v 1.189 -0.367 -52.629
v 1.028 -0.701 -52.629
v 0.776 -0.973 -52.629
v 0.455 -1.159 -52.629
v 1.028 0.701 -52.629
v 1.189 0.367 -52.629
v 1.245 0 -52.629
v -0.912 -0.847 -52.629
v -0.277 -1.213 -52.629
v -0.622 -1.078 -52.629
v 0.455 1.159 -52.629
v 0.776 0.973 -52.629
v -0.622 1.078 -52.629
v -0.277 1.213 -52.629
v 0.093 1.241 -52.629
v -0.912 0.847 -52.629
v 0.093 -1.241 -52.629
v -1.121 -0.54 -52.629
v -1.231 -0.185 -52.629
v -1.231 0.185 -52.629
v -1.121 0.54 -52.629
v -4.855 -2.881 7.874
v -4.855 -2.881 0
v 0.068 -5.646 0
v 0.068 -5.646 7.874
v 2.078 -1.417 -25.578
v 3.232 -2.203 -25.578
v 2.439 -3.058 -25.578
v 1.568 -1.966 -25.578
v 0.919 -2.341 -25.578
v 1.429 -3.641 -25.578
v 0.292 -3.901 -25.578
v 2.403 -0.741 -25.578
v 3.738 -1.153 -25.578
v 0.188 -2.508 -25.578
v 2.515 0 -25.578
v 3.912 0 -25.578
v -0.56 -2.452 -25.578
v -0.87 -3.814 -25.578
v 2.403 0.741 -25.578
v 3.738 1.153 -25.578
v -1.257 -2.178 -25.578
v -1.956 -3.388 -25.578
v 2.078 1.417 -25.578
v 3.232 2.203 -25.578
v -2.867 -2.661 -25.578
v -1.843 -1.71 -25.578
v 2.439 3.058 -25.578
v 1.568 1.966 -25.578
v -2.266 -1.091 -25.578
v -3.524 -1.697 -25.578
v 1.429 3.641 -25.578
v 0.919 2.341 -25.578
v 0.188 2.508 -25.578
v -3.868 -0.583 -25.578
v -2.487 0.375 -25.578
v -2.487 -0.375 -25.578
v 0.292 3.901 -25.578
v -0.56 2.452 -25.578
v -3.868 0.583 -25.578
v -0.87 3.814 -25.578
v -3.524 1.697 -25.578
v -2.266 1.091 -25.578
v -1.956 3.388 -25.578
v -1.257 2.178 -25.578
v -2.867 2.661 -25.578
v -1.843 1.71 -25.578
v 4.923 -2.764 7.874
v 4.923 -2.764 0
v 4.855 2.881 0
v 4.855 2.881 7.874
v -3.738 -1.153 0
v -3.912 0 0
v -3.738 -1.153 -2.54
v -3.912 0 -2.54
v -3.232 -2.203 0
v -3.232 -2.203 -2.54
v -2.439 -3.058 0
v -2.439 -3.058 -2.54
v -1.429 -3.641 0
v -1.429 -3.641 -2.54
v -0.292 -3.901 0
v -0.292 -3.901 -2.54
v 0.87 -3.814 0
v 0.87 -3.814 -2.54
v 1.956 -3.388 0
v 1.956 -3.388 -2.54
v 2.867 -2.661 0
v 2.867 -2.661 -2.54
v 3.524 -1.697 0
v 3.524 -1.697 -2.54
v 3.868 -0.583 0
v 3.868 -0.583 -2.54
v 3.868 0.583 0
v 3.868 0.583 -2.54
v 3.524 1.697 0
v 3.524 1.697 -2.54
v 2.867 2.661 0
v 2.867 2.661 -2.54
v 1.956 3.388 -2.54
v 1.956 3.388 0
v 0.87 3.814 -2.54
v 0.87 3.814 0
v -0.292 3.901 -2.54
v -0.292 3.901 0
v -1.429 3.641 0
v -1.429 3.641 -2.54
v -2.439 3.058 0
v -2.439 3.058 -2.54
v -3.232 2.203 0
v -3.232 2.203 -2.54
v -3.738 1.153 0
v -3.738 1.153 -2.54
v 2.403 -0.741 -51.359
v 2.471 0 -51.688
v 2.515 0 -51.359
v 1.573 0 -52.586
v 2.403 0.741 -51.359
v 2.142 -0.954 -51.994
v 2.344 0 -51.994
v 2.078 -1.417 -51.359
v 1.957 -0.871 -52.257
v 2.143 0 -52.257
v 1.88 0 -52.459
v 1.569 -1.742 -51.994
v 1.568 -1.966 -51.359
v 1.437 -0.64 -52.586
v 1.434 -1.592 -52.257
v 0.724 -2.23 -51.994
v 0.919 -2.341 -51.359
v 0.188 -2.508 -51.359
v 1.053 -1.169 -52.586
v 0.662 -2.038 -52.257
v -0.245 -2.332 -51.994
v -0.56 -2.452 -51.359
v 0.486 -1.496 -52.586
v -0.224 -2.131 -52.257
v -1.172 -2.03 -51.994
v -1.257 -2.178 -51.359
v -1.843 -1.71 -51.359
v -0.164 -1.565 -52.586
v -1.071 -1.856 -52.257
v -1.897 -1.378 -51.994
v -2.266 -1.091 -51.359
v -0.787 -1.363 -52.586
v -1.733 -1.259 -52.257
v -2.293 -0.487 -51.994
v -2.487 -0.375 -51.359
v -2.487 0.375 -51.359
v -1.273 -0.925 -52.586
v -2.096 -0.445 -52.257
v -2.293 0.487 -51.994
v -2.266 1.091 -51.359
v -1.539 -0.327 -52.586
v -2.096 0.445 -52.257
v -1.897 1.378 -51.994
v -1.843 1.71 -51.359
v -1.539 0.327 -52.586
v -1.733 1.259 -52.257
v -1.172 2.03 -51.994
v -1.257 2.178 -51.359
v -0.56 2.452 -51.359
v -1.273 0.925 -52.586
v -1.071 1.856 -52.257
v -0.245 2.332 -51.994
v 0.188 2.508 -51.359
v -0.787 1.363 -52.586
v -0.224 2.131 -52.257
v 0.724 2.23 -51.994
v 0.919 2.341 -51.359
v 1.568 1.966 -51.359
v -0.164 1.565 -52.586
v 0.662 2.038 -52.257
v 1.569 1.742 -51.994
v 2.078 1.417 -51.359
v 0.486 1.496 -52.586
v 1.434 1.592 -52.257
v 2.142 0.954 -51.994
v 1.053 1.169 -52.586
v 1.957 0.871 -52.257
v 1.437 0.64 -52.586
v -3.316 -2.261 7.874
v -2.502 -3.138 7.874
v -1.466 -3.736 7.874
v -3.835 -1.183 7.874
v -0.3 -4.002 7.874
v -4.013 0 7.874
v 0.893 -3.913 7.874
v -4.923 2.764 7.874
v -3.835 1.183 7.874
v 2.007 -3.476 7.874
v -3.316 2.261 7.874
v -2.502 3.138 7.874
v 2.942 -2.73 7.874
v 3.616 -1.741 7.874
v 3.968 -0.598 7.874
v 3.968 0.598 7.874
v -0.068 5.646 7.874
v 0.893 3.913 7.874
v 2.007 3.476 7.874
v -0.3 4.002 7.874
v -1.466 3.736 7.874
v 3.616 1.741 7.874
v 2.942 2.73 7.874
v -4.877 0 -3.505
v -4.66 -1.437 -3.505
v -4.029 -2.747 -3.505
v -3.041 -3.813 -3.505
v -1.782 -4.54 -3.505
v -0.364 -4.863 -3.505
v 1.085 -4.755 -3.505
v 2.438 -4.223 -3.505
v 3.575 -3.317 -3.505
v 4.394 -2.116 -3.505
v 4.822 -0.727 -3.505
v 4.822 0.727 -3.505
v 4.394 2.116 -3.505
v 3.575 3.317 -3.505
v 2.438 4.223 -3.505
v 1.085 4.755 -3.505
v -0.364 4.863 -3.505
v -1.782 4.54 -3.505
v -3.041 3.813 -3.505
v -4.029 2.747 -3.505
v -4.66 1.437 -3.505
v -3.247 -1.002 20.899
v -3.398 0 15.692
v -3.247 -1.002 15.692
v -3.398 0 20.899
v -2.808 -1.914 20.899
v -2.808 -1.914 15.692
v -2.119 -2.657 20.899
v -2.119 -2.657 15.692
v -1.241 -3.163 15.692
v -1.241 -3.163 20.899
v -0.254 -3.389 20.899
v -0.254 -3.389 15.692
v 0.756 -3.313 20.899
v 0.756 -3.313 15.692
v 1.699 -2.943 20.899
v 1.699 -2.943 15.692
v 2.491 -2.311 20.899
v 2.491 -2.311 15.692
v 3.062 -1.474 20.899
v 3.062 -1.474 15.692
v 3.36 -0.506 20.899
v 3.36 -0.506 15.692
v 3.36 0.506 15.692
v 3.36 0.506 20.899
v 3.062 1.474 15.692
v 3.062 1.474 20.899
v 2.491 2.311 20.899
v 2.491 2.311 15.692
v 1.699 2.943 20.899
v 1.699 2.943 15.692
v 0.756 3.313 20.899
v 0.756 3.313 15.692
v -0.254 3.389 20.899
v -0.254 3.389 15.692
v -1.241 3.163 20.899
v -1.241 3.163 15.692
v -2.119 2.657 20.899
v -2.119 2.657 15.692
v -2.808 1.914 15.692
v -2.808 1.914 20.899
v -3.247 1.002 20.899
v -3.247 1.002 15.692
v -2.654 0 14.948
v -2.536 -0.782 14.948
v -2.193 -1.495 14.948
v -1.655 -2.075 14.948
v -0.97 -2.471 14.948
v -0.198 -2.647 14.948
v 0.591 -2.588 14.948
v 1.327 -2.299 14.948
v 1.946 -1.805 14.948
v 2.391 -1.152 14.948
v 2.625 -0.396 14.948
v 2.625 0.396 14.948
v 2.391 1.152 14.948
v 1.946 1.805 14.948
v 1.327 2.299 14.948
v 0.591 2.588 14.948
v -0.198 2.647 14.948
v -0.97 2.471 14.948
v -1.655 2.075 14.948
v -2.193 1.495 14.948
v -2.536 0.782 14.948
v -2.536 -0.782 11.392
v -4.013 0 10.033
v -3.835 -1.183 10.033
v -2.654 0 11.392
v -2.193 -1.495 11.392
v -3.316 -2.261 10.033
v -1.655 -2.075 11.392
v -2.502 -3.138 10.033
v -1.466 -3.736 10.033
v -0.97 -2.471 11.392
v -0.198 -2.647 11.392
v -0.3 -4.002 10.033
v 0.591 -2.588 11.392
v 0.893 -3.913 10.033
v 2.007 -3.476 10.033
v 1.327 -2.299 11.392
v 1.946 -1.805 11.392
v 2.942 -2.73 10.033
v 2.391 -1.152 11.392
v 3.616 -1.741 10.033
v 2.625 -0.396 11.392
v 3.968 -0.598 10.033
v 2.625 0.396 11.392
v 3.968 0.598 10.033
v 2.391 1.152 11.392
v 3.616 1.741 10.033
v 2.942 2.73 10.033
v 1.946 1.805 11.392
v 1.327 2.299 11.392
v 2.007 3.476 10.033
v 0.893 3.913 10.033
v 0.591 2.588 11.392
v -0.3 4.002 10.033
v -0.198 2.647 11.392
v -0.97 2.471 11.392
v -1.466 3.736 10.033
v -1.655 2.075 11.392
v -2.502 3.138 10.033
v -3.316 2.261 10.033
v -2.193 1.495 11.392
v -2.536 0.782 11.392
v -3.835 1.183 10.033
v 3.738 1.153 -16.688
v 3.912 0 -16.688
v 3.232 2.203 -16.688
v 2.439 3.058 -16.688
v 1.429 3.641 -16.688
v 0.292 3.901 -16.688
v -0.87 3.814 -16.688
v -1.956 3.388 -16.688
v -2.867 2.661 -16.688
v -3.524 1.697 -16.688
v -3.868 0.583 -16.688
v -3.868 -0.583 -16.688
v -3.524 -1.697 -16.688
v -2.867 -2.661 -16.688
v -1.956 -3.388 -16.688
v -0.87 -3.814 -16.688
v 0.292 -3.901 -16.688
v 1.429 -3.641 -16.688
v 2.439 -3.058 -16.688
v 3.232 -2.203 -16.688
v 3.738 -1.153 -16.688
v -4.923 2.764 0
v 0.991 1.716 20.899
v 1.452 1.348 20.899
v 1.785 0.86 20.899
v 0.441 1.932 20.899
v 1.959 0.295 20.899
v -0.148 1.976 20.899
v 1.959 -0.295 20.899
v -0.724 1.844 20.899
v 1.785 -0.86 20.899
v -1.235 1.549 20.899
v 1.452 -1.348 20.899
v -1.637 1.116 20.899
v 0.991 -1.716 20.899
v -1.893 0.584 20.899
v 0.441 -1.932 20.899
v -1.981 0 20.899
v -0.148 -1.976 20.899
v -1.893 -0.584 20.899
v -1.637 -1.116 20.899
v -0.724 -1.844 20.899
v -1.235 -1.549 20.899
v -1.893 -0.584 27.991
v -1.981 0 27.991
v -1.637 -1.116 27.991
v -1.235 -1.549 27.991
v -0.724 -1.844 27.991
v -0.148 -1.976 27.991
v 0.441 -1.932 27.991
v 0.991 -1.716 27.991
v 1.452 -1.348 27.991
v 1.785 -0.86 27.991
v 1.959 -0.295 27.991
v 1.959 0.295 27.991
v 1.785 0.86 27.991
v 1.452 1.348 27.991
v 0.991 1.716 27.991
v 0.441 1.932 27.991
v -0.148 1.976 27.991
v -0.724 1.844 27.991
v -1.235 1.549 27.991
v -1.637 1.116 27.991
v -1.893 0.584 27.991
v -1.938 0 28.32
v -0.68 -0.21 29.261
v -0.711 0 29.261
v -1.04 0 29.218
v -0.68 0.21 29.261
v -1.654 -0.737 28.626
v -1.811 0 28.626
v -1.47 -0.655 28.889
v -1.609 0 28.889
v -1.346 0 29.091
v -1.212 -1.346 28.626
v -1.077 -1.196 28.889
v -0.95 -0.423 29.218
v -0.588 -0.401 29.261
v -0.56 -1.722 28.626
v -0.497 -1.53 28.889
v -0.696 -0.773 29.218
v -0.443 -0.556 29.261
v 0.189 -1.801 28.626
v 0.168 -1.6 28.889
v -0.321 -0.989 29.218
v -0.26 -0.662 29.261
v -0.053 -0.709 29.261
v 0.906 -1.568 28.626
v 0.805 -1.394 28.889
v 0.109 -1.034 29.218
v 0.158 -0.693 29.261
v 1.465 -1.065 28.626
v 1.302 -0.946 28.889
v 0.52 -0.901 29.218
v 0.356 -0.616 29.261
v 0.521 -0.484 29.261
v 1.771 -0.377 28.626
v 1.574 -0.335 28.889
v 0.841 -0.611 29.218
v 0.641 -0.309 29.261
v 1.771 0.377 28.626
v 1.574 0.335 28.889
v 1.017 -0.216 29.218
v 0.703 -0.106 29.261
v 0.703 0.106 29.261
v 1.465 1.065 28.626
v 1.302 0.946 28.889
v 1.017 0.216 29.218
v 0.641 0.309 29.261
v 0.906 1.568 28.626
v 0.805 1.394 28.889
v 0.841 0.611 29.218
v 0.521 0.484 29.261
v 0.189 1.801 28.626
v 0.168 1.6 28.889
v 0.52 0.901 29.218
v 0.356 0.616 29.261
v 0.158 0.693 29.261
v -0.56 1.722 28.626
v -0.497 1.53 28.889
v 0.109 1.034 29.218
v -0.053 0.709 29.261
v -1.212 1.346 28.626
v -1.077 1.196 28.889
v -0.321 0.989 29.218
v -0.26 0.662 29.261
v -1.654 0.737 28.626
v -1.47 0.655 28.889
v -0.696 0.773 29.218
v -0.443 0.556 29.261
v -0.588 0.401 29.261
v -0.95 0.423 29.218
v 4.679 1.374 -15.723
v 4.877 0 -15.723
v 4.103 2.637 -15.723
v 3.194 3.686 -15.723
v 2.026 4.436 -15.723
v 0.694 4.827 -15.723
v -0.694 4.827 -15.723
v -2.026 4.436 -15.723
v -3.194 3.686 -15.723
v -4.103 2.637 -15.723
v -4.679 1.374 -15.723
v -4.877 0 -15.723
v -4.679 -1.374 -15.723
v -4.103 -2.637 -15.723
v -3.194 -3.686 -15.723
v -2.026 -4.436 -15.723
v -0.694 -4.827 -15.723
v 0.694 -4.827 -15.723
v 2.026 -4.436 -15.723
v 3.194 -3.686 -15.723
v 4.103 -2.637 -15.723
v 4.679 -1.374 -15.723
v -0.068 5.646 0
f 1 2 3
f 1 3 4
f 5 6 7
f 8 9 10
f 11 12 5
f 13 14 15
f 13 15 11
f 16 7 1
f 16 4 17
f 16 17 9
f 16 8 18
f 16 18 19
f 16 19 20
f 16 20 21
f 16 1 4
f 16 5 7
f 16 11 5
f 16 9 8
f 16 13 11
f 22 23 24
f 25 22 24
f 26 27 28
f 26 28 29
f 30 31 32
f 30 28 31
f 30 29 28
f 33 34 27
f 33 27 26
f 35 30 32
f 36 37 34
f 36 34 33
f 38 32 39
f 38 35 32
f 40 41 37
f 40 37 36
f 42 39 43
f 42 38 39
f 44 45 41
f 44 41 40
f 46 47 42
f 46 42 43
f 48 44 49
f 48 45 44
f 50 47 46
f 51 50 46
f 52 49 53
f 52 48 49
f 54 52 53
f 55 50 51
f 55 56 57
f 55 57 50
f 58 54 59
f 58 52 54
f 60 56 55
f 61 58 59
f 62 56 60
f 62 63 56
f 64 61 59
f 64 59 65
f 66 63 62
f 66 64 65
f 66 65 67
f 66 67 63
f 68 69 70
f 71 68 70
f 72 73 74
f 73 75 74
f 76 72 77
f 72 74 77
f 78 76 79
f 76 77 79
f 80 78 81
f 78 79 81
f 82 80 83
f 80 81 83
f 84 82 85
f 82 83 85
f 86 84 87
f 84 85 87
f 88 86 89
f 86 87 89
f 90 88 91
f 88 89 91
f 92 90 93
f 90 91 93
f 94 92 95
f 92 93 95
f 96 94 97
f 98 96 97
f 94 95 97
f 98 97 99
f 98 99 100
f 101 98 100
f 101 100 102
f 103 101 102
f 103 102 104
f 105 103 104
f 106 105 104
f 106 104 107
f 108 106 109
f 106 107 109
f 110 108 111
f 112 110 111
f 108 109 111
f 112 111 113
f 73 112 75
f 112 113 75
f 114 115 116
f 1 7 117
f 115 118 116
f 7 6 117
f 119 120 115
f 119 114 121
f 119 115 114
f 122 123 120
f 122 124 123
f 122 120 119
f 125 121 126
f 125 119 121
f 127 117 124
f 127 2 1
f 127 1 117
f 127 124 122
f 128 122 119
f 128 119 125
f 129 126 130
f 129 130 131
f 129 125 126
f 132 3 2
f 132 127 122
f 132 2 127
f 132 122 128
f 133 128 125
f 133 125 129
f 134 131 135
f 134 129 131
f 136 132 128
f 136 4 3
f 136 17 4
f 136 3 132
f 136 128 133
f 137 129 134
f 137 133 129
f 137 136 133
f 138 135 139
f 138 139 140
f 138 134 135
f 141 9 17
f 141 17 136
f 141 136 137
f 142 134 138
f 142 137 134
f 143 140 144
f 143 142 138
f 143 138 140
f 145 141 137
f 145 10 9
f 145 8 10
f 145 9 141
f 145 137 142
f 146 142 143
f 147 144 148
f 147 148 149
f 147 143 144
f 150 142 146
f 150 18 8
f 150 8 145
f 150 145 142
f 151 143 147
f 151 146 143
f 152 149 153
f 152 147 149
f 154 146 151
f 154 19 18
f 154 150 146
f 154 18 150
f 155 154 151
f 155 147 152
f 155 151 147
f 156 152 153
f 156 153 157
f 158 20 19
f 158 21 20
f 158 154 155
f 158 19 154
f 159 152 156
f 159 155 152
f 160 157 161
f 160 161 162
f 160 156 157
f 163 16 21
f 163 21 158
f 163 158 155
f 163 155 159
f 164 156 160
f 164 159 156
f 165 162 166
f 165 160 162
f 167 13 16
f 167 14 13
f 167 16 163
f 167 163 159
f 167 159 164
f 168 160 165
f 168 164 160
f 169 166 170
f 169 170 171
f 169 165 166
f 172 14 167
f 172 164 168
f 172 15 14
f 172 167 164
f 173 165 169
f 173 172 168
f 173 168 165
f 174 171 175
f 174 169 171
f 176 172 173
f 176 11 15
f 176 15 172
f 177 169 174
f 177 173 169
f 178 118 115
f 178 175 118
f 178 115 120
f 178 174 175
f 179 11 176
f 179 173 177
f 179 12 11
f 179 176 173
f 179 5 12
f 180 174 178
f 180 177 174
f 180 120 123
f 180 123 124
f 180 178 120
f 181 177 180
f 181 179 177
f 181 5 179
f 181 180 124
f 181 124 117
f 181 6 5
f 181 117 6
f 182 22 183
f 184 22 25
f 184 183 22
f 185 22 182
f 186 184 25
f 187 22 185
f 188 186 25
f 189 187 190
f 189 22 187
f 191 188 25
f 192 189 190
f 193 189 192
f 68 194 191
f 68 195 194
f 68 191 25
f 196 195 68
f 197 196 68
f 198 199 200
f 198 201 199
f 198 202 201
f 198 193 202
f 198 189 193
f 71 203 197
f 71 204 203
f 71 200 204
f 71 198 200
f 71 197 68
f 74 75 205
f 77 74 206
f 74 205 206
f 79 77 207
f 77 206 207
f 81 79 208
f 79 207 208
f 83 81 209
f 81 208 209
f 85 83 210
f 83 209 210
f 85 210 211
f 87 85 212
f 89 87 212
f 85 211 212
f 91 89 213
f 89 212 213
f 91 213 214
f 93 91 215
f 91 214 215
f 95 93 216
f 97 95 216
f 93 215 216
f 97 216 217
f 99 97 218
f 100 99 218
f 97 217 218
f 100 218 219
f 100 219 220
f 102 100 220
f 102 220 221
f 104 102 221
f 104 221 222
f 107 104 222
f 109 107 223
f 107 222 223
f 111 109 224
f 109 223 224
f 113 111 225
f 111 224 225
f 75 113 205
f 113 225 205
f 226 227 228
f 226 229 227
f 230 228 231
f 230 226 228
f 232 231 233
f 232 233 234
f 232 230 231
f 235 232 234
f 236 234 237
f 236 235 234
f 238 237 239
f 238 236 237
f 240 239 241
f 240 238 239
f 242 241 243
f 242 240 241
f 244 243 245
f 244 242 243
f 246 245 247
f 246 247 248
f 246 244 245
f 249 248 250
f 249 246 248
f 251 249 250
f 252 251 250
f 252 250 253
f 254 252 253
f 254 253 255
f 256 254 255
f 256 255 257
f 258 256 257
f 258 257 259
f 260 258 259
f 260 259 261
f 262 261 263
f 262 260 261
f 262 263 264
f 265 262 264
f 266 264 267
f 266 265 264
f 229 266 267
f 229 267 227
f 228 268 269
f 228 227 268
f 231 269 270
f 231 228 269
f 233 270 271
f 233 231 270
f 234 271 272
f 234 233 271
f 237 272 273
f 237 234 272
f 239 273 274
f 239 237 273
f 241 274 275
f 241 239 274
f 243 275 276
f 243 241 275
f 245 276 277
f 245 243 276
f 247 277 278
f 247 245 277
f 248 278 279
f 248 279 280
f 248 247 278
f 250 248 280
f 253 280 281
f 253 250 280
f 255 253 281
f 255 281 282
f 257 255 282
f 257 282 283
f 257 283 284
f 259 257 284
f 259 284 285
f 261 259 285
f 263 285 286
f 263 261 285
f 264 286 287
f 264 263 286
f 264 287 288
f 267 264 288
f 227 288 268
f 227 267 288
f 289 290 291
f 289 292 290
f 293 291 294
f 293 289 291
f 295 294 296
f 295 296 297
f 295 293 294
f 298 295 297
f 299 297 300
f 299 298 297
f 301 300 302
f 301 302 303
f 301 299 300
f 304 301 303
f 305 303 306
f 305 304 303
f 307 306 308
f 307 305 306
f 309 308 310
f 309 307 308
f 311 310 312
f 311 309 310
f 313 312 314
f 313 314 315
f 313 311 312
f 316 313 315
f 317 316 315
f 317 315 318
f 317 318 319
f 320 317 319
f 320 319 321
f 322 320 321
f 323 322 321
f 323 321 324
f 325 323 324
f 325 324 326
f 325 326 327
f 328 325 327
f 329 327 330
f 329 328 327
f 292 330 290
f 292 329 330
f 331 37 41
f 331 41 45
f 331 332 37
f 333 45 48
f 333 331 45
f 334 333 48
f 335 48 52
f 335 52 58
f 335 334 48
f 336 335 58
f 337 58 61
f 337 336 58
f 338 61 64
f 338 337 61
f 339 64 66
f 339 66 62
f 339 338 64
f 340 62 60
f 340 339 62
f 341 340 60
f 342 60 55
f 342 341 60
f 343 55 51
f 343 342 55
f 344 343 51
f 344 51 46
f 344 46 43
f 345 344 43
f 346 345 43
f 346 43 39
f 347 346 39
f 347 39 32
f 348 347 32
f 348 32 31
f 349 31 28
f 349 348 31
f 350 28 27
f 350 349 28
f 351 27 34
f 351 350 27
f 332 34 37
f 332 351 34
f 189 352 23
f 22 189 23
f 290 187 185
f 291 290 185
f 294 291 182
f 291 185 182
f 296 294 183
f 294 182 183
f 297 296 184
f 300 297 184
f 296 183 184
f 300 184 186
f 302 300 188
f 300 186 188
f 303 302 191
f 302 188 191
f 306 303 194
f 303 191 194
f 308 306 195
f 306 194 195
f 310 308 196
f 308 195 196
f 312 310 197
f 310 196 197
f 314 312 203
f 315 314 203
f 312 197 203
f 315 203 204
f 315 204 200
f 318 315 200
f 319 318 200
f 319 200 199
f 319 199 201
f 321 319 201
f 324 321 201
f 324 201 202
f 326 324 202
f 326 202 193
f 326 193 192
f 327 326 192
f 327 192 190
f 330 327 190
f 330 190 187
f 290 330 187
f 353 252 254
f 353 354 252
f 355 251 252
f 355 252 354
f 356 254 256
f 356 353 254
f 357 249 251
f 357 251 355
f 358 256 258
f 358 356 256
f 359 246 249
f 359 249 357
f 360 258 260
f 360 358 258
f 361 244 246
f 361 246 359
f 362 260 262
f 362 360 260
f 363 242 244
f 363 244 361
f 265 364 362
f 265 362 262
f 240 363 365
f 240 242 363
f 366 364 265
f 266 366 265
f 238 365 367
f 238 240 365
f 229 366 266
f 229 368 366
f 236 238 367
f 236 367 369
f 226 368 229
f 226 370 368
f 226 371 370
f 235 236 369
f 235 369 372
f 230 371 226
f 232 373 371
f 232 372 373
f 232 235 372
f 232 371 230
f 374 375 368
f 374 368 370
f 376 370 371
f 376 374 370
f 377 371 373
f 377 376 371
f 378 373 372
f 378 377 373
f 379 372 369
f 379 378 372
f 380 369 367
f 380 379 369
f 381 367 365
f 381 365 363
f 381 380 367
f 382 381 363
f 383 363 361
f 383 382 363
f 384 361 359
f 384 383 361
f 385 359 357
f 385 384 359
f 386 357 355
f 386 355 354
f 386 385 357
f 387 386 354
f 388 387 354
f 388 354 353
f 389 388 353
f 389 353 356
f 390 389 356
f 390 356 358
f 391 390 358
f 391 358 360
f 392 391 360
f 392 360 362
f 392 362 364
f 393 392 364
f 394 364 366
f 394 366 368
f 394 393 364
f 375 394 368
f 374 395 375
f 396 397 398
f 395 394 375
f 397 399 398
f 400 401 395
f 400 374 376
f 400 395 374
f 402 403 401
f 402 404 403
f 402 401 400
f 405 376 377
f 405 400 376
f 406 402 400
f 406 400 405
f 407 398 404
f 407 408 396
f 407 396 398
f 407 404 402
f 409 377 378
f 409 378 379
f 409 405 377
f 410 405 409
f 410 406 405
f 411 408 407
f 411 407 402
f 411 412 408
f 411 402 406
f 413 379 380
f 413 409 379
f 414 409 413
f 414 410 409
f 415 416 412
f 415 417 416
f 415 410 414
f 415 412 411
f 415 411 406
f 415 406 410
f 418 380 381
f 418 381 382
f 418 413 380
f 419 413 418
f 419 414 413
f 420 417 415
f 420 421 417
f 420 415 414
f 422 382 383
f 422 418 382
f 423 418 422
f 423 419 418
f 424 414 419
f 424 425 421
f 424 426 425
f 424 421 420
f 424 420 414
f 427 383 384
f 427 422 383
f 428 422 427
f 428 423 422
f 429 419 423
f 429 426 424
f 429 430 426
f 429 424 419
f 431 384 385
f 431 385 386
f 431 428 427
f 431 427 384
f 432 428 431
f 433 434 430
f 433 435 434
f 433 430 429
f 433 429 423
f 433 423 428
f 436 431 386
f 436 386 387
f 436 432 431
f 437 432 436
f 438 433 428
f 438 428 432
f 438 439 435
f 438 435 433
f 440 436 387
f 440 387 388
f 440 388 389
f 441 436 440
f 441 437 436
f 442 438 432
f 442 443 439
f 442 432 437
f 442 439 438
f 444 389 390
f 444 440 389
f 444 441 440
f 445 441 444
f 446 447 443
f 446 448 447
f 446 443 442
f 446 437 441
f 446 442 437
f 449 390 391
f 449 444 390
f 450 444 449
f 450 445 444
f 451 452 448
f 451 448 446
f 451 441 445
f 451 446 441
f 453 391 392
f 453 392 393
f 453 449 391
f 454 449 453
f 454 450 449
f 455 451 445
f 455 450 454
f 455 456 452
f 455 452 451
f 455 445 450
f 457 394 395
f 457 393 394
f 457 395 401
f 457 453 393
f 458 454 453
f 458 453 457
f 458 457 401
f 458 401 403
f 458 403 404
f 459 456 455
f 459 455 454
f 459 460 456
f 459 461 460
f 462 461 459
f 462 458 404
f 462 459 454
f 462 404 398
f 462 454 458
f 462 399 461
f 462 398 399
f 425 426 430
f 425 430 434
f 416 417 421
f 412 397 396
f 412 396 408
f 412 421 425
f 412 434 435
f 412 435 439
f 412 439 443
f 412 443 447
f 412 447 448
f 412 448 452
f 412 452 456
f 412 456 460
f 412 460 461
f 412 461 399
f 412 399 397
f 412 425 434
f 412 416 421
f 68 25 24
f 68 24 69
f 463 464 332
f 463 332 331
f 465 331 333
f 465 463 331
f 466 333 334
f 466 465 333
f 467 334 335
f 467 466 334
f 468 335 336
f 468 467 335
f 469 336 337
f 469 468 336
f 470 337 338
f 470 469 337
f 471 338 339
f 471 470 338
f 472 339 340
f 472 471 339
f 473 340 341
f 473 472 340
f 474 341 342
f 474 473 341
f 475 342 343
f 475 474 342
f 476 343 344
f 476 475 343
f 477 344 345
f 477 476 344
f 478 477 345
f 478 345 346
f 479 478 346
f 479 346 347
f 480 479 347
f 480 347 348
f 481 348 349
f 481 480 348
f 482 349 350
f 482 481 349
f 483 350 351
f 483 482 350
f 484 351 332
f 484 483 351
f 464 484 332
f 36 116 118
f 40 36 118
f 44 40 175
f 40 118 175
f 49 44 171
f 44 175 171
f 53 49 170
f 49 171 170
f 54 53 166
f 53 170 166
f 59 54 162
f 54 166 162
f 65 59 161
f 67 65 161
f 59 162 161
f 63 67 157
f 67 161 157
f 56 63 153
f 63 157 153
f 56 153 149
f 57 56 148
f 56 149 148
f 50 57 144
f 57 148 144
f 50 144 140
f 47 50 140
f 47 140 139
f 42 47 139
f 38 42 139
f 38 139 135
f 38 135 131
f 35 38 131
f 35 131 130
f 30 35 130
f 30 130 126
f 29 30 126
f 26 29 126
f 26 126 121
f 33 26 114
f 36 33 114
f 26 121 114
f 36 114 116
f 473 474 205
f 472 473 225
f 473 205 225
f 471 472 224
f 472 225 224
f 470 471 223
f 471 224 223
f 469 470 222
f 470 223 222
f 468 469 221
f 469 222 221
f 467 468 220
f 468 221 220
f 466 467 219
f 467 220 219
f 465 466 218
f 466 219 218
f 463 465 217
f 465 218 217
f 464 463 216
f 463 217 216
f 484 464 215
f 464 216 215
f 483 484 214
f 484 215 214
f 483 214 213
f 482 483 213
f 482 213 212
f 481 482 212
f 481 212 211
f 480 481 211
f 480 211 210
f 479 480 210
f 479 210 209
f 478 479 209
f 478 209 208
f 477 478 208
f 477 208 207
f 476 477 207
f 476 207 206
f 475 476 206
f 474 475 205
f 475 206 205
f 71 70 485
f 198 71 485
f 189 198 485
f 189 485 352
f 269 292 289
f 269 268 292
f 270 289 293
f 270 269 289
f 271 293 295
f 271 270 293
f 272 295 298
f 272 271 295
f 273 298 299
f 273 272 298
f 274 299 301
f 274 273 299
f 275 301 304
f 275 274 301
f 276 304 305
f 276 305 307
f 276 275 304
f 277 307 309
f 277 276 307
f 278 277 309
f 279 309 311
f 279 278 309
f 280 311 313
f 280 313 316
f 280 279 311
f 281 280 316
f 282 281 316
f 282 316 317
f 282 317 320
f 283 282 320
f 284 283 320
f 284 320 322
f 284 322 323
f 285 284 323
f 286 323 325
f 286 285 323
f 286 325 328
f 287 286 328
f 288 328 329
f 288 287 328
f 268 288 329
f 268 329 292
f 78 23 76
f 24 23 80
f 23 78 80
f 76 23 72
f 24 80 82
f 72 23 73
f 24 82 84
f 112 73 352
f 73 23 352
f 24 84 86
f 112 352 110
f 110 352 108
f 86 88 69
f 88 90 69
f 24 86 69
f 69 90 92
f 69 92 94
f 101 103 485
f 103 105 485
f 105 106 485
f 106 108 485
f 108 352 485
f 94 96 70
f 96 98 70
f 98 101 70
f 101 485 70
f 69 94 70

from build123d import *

# Parameters (mm, degrees)
BOSS_EXTRUDE1_DEPTH = 7.874
SKETCH2_R           = 4.0132
BOSS_EXTRUDE2_DEPTH = 21.3868
SKETCH3_R           = 4.8768
BOSS_EXTRUDE3_DEPTH = 52.6288
SKETCH10_W          = 30.48
SKETCH10_H          = 3.81
FILLET1_R           = 1.27
FILLET2_R           = 1.27


with BuildPart() as part:
    # Sketch1 → Boss-Extrude1 (new body)
    with BuildSketch(Plane.XY):
        Polygon((4.8552834, 2.881406504), (-0.067729531, 5.645502019), (-4.923012931, 2.764095515), (-4.8552834, -2.881406504), (0.067729531, -5.645502019), (4.923012931, -2.764095515), align=None)
    extrude(amount=BOSS_EXTRUDE1_DEPTH)

    # Sketch2 → Boss-Extrude2 (add)
    with BuildSketch(Plane.XY.offset(7.874)):
        with Locations(Location((0, 0, 0), (0, 0, 180))):
            Circle(SKETCH2_R)
    extrude(amount=BOSS_EXTRUDE2_DEPTH)

    # Sketch3 → Boss-Extrude3 (add)
    with BuildSketch(Plane(origin=(0, 0, 0), x_dir=(-1, 0, 0), z_dir=(0, 0, -1))):
        Circle(SKETCH3_R)
    extrude(amount=BOSS_EXTRUDE3_DEPTH)

    # Sketch8 → Cut-Revolve1 (revolve, cut)
    with BuildSketch(Plane(origin=(0, 0, 0), x_dir=(0, 0, -1), z_dir=(1, 0, 0)), mode=Mode.PRIVATE) as cut_revolve1_sk:
        Polygon((0, 3.9116), (2.54, 3.9116), (4.896343106, 6.267943106), (4.896343106, 7.7216), (0, 7.7216), align=None)
    revolve(cut_revolve1_sk.sketch.rotate(Axis((0, 0, -56.72328), (0, 0, 1)), 90), axis=Axis((0, 0, -56.72328), (0, 0, 1)), mode=Mode.SUBTRACT)

    # Sketch9 → Cut-Revolve2 (revolve, cut)
    with BuildSketch(Plane(origin=(0, 0, 0), x_dir=(0, 0, -1), z_dir=(1, 0, 0)), mode=Mode.PRIVATE) as cut_revolve2_sk:
        Polygon((16.6878, 3.9116), (14.870743755, 5.728656245), (14.870743755, 7.7216), (25.5778, 7.7216), (25.5778, 3.9116), align=None)
    revolve(cut_revolve2_sk.sketch.rotate(Axis((0, 0, -56.72328), (0, 0, 1)), 270), axis=Axis((0, 0, -56.72328), (0, 0, 1)), mode=Mode.SUBTRACT)

    # Sketch10 → Cut-Revolve3 (revolve, cut)
    with BuildSketch(Plane(origin=(0, 0, 0), x_dir=(0, 0, -1), z_dir=(1, 0, 0)), mode=Mode.PRIVATE) as cut_revolve3_sk:
        with Locations((40.8178, 4.4196)):
            Rectangle(SKETCH10_W, SKETCH10_H)
    revolve(cut_revolve3_sk.sketch.rotate(Axis((0, 0, -56.72328), (0, 0, 1)), 270), axis=Axis((0, 0, -56.72328), (0, 0, 1)), mode=Mode.SUBTRACT)

    # Fillet1
    fillet1_edges = [part.edges().sort_by_distance(p)[0] for p in [
        (-2.5146, 0, -52.6288),
    ]]
    fillet(fillet1_edges, radius=FILLET1_R)

    # Sketch13 → Cut-Revolve4 (revolve, cut)
    with BuildSketch(Plane(origin=(0, 0, 0), x_dir=(0, 0, -1), z_dir=(1, 0, 0)), mode=Mode.PRIVATE) as cut_revolve4_sk:
        Polygon((-10.033, 4.0132), (-11.3919, 2.6543), (-14.9479, 2.6543), (-15.691743647, 3.398143647), (-20.898743647, 3.398143647), (-20.898743647, 1.9812), (-29.2608, 1.9812), (-29.2608, 6.514945502), (-10.033, 6.514945502), align=None)
    revolve(cut_revolve4_sk.sketch.rotate(Axis((0, 0, -56.72328), (0, 0, 1)), 90), axis=Axis((0, 0, -56.72328), (0, 0, 1)), mode=Mode.SUBTRACT)

    # Fillet2
    fillet2_edges = [part.edges().sort_by_distance(p)[0] for p in [
        (1.9812, 0, 29.2608),
    ]]
    fillet(fillet2_edges, radius=FILLET2_R)


solid = part.part
